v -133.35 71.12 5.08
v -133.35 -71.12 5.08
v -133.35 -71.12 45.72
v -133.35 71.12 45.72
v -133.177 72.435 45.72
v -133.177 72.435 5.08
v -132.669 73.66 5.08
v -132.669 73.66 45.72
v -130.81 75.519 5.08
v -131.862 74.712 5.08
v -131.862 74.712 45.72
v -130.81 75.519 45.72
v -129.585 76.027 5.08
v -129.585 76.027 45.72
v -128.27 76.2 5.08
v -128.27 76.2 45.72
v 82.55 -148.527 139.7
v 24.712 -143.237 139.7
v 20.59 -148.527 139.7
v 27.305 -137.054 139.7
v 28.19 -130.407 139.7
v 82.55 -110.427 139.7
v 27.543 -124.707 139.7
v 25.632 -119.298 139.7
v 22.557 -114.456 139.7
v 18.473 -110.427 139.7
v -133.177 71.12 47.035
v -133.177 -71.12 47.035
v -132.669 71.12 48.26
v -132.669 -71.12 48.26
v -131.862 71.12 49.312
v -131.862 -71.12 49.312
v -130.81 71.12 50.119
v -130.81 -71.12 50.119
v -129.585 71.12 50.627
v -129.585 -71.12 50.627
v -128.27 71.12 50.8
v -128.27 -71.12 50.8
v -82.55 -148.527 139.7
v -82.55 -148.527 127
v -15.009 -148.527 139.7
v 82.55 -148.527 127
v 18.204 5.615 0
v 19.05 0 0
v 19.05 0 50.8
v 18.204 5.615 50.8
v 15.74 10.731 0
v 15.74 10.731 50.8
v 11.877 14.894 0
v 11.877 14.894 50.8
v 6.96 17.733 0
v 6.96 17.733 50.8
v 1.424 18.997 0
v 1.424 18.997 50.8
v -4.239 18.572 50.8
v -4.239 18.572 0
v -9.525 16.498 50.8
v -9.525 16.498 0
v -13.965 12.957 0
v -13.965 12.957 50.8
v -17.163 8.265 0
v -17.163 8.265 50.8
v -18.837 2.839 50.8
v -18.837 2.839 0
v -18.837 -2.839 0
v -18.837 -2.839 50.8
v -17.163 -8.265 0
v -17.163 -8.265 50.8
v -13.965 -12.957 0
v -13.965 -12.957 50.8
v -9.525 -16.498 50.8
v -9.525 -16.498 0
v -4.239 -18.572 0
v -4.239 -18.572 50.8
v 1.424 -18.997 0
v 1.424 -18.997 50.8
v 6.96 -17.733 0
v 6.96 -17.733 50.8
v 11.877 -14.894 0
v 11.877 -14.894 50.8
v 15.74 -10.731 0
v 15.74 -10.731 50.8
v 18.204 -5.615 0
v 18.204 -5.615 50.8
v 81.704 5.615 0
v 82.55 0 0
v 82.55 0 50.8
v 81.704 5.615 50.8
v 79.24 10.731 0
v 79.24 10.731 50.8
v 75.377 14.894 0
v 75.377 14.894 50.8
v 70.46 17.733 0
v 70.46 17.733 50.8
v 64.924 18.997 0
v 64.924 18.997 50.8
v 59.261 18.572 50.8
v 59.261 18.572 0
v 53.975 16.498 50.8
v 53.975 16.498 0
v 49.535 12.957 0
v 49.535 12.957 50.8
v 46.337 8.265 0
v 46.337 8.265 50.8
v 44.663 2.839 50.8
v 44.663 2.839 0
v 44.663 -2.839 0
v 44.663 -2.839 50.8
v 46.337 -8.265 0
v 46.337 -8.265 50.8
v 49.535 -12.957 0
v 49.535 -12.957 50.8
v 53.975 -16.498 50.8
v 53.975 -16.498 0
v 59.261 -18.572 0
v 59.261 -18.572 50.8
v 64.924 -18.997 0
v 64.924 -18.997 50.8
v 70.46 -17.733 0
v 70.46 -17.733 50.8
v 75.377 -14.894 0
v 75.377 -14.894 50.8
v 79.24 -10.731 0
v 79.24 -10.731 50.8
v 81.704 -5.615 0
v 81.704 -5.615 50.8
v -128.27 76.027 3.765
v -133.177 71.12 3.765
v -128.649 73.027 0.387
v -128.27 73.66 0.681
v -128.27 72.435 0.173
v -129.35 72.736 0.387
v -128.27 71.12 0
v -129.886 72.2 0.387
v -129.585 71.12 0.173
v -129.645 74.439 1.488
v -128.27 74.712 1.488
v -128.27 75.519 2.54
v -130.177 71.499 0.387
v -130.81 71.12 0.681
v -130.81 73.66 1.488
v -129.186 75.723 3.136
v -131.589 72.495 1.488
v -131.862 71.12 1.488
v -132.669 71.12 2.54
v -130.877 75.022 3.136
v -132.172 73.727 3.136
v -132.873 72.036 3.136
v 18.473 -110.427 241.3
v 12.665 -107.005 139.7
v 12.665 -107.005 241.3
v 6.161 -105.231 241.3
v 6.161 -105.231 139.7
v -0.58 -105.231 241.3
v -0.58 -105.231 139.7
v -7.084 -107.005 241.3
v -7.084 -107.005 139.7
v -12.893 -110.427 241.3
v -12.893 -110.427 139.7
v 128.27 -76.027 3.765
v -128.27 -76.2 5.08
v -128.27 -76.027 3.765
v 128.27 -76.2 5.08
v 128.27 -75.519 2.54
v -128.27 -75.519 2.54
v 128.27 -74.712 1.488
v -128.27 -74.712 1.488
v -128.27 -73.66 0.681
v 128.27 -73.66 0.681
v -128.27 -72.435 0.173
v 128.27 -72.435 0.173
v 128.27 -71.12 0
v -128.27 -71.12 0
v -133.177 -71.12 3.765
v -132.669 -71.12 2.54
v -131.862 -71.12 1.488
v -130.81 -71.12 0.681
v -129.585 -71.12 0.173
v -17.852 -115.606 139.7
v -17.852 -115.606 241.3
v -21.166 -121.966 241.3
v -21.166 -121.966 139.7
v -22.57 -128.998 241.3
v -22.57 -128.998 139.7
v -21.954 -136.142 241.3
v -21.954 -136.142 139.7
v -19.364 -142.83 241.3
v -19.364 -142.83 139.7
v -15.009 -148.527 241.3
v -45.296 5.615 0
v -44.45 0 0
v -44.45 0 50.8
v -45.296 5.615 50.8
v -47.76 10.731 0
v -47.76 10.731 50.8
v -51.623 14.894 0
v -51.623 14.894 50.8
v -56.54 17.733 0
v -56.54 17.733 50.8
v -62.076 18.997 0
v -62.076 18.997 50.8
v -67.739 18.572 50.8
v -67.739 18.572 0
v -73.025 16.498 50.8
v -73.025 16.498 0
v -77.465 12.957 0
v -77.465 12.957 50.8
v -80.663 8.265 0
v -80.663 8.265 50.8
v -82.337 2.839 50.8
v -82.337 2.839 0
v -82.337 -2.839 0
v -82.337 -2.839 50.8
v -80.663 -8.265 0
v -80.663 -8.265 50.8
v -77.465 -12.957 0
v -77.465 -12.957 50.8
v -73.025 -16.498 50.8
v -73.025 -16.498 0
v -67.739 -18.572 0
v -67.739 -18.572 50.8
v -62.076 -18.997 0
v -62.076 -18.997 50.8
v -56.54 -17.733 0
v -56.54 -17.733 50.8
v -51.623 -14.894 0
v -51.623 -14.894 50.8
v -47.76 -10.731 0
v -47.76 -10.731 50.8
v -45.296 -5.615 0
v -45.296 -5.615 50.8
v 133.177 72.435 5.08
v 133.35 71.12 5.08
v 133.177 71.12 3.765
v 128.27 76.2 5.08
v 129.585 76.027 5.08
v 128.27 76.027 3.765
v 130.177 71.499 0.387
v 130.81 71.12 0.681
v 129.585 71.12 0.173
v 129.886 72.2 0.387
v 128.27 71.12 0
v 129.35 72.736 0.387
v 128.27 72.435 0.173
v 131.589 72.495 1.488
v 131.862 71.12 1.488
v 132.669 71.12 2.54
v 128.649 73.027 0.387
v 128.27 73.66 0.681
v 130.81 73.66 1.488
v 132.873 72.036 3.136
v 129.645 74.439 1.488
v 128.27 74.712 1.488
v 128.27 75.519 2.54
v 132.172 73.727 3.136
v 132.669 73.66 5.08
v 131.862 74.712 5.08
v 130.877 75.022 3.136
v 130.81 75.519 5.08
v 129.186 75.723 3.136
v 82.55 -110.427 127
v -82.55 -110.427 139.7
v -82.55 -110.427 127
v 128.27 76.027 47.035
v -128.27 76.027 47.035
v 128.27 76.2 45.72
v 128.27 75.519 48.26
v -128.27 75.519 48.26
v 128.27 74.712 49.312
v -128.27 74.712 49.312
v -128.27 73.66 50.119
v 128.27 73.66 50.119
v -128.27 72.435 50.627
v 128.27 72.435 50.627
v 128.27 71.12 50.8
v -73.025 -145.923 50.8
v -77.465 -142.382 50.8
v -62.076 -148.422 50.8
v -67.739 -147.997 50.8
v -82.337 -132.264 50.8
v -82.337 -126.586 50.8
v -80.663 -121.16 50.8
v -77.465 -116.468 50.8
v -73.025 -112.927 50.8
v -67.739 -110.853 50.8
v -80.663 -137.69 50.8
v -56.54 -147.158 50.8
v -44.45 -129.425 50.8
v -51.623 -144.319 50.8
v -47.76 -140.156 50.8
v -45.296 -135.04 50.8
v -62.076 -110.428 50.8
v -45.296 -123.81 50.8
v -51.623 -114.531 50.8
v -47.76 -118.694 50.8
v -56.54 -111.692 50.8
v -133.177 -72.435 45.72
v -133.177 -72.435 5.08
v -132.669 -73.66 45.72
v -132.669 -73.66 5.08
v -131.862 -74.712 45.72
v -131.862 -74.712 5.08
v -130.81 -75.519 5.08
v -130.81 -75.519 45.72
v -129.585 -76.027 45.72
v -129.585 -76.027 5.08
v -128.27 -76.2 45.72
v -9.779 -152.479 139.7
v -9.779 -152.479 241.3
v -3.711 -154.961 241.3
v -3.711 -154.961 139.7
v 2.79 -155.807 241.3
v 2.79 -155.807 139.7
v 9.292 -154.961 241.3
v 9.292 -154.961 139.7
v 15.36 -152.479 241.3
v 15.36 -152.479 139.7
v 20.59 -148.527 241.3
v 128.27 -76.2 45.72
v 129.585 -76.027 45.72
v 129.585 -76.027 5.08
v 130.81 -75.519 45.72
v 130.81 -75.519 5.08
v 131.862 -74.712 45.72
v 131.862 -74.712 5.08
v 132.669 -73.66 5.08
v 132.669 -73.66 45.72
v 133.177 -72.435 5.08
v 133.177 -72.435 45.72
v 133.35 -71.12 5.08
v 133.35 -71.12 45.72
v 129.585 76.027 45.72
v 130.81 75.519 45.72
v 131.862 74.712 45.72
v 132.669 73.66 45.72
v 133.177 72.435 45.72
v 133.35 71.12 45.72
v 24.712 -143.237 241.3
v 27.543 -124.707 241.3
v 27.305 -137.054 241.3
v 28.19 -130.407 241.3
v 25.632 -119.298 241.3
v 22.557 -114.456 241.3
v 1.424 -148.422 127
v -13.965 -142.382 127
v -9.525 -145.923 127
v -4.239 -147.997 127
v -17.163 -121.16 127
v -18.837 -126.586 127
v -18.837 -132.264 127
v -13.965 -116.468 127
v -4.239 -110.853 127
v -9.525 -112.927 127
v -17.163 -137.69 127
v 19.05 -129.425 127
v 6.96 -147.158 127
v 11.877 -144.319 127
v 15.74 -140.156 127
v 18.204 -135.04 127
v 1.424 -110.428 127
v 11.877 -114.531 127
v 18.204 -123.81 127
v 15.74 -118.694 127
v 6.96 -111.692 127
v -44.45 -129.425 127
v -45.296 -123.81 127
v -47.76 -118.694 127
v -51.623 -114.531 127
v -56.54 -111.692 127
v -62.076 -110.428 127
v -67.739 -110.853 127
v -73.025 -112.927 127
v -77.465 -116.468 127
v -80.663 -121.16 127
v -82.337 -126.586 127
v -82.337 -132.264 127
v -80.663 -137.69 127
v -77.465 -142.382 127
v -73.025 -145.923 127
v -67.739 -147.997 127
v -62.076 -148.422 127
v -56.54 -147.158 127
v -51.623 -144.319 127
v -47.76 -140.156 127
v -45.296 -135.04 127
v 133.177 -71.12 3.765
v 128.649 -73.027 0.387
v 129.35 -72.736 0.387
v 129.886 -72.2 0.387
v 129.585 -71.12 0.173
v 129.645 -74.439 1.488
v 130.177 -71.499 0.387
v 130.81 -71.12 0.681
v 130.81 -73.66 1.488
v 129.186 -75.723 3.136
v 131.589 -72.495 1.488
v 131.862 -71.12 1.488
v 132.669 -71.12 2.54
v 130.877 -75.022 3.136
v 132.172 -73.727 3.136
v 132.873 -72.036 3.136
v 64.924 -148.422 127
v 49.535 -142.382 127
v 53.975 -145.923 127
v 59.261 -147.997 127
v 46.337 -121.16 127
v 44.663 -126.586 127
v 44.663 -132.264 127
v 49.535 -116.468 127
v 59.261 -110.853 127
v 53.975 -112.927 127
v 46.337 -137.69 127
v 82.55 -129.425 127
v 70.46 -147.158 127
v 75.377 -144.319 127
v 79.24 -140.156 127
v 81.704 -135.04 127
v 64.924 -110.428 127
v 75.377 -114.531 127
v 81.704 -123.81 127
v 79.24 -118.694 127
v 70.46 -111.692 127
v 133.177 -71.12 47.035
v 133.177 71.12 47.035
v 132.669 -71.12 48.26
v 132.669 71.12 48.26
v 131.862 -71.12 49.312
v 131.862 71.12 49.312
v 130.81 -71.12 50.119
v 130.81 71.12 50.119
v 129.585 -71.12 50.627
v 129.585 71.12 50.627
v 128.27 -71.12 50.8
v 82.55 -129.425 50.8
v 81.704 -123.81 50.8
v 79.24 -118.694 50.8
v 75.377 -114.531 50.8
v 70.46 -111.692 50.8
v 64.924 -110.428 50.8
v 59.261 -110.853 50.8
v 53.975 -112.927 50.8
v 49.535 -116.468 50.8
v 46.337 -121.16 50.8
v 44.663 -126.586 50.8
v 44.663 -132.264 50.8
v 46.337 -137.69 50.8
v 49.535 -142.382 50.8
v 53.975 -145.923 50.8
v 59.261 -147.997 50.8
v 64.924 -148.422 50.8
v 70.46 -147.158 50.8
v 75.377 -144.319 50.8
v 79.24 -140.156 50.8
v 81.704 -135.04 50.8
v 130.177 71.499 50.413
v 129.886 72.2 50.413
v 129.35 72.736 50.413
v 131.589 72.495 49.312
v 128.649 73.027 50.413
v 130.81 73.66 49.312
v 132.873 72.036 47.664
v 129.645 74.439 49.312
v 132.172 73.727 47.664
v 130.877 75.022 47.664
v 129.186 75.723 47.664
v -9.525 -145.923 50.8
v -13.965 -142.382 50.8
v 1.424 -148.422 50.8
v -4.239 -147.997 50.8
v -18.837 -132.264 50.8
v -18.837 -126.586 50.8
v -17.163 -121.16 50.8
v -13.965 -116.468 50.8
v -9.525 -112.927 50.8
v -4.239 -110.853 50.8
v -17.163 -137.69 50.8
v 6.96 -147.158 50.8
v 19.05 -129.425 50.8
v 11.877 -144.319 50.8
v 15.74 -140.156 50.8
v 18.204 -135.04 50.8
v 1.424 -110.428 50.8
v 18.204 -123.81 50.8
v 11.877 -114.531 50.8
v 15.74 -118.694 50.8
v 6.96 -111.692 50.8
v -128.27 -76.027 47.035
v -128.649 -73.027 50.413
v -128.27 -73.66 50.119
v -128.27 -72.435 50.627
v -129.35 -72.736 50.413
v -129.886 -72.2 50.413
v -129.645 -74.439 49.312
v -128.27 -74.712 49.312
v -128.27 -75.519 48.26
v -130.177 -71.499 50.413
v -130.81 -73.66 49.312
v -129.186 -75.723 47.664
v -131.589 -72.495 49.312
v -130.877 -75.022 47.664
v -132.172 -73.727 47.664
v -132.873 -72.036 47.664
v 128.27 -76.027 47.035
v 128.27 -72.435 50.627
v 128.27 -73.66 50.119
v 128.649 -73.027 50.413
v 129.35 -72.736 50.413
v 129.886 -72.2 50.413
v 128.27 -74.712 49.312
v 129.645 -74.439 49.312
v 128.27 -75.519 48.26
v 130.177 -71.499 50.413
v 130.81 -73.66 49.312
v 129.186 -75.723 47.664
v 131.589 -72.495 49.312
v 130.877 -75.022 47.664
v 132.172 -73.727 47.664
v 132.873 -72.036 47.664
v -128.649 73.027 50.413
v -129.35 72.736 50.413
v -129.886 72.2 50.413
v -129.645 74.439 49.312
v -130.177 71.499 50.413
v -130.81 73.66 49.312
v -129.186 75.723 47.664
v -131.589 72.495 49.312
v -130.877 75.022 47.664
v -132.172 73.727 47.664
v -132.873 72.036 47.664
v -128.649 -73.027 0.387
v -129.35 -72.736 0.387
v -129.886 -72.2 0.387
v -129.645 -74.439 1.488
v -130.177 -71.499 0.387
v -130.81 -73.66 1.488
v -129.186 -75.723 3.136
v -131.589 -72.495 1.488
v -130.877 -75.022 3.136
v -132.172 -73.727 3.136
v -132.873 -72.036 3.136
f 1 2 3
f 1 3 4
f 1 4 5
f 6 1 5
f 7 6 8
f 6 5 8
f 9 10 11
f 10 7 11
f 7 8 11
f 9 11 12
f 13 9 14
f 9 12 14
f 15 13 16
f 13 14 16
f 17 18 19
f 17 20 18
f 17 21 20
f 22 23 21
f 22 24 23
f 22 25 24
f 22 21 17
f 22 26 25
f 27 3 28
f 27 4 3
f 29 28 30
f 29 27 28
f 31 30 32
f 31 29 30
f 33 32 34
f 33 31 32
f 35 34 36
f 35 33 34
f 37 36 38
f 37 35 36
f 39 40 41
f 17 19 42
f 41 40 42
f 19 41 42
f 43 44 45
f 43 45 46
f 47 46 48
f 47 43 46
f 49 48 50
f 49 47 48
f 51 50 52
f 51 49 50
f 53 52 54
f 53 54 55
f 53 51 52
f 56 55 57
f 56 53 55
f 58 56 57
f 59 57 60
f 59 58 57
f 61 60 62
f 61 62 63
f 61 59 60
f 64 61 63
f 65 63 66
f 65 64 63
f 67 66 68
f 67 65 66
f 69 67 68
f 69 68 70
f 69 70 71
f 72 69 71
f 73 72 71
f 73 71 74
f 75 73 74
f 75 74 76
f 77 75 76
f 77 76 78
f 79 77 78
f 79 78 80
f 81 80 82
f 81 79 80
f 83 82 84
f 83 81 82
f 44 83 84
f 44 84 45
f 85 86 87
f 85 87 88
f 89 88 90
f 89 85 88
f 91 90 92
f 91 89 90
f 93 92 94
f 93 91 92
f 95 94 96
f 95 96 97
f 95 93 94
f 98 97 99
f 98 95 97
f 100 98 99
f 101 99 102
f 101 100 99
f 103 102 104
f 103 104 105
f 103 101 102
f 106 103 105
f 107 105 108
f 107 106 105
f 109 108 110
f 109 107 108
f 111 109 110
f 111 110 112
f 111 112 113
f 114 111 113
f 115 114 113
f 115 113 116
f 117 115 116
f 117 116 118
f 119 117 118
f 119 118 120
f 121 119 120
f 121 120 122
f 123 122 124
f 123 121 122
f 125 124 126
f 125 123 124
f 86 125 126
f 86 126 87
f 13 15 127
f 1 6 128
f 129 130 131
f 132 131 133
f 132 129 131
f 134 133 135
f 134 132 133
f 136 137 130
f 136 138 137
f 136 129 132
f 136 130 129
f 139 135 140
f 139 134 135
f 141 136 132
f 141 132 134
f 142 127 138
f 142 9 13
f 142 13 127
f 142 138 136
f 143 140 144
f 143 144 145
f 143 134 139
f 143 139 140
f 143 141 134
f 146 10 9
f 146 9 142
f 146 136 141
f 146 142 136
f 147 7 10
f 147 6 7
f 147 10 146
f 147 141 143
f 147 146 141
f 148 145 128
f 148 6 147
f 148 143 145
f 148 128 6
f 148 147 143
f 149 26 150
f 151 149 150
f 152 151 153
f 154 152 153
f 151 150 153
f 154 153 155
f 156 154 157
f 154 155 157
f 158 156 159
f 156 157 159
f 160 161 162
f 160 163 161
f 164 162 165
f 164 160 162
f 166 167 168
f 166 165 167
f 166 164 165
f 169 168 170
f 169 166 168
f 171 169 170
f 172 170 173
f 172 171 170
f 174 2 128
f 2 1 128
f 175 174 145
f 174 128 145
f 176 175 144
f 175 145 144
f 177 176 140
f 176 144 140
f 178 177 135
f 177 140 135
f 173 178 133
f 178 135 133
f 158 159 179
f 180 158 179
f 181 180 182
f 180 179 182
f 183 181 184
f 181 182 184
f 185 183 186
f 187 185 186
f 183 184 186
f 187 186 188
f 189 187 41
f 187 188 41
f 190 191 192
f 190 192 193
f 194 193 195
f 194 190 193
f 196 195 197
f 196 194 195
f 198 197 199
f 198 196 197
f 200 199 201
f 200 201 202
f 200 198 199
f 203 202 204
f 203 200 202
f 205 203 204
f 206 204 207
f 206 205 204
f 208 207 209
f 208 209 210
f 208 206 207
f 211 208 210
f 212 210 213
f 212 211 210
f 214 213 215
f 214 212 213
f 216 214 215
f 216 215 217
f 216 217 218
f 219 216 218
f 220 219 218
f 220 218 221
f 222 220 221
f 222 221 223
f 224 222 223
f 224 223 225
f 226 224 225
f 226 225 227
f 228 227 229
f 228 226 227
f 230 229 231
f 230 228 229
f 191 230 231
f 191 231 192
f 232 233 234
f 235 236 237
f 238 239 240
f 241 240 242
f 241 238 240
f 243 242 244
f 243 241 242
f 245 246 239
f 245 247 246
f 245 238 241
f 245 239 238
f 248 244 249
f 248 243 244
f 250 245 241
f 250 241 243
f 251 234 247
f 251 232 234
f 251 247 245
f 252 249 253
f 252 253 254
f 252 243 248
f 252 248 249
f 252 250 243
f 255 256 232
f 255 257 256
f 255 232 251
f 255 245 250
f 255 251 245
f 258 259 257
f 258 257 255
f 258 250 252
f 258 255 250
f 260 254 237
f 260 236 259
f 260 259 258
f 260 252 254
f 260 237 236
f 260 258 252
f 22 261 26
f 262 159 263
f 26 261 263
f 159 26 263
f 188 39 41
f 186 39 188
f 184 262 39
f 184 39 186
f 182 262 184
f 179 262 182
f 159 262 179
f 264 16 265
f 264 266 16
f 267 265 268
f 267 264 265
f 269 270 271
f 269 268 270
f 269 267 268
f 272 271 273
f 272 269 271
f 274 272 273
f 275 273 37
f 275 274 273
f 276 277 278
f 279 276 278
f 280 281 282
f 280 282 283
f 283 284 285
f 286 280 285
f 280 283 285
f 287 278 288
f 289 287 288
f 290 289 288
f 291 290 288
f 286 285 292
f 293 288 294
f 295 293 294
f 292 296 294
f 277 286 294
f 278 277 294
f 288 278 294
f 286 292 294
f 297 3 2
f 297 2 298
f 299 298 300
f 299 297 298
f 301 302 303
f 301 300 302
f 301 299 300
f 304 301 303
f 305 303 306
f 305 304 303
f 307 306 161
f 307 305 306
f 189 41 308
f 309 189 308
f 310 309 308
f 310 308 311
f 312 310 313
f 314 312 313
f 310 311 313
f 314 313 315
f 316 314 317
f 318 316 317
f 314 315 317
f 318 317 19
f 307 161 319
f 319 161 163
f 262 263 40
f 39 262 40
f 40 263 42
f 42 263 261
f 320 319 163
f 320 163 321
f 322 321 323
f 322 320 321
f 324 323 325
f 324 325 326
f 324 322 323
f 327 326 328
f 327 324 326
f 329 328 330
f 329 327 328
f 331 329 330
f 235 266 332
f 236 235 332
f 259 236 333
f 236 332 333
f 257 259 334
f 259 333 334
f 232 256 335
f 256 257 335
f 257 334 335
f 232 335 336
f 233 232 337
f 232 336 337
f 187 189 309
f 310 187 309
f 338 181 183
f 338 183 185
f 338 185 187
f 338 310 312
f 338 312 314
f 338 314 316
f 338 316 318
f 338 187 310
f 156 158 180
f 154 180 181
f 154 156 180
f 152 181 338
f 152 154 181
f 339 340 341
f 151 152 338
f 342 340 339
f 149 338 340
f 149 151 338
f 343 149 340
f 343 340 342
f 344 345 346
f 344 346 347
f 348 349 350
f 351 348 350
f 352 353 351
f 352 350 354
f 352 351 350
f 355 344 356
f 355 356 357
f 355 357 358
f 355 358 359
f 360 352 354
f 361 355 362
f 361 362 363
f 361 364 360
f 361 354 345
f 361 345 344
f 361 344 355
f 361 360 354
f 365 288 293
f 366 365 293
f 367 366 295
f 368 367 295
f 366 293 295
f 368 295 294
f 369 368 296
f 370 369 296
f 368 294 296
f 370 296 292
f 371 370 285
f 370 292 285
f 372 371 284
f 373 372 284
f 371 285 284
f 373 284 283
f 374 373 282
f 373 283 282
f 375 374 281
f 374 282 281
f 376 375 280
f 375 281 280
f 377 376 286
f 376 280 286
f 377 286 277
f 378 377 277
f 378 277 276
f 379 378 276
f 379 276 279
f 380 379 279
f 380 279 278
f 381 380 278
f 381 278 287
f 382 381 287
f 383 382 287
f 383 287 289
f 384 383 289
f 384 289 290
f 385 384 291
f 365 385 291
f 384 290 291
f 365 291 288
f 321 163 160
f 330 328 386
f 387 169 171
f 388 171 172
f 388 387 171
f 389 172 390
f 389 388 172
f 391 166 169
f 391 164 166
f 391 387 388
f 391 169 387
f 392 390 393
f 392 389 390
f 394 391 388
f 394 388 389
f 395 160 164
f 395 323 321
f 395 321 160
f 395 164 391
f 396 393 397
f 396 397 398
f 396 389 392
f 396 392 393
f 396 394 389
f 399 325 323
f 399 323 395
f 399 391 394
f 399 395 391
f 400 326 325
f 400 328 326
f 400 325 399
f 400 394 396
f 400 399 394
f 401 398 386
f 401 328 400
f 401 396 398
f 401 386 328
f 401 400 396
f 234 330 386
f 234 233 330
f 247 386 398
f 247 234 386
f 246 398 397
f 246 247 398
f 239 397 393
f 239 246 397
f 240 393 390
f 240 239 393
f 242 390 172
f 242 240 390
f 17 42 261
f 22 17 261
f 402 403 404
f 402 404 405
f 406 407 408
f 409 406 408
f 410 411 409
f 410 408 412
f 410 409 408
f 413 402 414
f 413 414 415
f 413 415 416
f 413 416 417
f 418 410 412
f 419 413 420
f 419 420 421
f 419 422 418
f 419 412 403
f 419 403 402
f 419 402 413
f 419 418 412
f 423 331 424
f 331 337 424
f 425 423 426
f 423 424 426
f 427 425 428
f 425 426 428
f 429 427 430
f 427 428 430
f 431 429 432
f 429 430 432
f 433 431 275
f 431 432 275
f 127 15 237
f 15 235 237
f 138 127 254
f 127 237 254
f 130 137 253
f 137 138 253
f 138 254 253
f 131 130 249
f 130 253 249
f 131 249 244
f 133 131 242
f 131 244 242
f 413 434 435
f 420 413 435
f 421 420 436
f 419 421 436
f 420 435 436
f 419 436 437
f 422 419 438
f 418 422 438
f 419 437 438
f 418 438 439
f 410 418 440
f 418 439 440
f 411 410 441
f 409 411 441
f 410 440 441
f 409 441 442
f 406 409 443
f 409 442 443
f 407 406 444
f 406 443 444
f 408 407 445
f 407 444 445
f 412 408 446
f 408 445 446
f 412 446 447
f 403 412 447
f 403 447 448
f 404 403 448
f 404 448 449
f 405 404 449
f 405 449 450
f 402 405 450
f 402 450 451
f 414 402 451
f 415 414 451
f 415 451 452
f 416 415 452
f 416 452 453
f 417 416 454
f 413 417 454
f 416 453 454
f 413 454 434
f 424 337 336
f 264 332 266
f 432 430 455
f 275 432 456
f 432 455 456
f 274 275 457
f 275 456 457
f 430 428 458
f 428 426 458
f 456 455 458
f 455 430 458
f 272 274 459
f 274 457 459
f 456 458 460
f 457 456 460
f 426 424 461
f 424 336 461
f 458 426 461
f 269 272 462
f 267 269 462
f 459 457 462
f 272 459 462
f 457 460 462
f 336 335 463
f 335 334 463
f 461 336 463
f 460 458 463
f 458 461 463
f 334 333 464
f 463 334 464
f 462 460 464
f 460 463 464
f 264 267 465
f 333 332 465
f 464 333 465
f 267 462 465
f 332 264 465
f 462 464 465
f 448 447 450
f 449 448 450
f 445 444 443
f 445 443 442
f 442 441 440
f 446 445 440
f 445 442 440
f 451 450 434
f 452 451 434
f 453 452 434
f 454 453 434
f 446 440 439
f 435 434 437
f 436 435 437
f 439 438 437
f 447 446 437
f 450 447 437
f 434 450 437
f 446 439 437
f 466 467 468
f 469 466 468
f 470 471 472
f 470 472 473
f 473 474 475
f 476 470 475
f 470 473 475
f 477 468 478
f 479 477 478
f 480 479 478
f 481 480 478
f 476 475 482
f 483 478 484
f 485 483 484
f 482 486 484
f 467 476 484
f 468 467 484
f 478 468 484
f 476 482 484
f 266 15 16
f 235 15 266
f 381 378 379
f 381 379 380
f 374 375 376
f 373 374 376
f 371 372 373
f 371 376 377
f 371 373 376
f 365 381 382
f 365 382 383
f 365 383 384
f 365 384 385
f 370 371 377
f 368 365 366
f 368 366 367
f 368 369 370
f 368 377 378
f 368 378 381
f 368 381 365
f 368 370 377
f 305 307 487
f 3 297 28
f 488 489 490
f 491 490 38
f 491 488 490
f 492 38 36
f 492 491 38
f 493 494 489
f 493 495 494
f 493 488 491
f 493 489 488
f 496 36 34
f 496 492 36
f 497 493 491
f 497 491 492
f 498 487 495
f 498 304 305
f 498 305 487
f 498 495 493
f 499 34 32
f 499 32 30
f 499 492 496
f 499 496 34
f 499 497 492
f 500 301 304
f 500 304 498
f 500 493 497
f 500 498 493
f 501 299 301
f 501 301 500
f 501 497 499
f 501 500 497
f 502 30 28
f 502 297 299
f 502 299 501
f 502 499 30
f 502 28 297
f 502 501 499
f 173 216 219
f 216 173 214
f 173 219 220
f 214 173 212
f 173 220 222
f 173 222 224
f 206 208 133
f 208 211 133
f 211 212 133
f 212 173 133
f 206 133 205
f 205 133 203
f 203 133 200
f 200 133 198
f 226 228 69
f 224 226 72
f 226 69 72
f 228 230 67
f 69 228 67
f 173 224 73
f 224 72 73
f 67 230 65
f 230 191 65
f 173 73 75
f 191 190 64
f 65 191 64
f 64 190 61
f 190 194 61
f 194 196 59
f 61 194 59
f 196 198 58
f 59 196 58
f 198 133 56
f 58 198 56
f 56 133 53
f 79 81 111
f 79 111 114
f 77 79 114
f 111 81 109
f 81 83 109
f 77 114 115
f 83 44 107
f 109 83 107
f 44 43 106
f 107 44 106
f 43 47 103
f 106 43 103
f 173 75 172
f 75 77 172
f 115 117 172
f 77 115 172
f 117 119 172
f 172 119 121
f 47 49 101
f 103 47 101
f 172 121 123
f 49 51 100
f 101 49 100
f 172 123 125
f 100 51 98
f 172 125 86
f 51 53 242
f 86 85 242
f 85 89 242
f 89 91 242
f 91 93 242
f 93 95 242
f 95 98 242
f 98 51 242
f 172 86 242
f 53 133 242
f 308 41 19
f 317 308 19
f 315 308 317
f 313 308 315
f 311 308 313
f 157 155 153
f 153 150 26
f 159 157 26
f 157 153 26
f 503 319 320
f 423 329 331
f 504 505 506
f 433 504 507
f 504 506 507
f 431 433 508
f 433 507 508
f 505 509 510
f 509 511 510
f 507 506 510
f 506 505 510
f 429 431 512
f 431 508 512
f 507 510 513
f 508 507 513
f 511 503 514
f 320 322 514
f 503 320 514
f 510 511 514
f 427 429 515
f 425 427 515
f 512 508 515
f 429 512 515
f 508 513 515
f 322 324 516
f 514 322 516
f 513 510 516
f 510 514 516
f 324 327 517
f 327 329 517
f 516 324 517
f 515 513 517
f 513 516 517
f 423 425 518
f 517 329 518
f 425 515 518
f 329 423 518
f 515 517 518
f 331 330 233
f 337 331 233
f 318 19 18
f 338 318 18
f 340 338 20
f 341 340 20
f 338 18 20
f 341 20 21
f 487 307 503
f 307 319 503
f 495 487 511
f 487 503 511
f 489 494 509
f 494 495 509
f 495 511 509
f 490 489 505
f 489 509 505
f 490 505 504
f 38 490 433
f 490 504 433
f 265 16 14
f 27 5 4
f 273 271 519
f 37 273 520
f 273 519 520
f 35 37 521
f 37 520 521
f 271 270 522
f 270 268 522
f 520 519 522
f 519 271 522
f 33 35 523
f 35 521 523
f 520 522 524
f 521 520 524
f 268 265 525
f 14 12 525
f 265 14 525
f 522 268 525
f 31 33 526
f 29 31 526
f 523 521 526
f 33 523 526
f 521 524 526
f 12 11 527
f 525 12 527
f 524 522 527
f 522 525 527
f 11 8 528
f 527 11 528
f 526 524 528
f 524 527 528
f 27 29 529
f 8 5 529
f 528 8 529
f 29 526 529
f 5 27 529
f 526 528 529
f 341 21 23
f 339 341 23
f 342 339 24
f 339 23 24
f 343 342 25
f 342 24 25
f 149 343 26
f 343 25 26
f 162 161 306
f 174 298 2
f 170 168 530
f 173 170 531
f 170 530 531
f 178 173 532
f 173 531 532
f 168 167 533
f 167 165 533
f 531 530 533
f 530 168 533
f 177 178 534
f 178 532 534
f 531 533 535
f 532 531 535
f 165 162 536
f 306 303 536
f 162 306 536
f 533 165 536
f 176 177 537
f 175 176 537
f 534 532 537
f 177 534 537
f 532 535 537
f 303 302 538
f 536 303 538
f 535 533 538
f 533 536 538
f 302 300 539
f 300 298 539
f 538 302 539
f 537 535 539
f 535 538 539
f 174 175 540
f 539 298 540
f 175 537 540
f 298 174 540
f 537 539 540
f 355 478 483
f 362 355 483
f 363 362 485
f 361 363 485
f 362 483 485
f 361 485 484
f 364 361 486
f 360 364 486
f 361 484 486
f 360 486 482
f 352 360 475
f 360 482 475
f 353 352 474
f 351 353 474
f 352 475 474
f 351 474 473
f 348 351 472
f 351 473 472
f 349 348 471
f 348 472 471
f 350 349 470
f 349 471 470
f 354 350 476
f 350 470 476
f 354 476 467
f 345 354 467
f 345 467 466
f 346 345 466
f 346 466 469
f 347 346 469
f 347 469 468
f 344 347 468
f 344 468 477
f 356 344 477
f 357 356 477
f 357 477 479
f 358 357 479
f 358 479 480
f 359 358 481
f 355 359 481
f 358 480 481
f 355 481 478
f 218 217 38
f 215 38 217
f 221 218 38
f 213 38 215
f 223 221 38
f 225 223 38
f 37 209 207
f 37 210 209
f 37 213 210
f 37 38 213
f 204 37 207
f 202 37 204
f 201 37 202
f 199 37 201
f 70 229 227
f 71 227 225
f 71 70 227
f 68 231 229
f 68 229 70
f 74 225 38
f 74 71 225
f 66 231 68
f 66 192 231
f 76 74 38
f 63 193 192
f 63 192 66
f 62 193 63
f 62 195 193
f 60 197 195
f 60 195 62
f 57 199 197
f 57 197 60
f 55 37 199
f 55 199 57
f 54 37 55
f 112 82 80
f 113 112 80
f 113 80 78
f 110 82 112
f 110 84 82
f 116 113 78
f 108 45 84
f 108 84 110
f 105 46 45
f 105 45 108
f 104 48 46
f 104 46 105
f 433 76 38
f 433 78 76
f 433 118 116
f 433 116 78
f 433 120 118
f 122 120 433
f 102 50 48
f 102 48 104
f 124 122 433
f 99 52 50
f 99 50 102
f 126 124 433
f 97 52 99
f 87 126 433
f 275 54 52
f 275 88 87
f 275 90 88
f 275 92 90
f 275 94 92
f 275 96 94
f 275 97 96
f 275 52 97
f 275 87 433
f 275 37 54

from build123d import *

# Parameters (mm, degrees)
F0_W     = 266.7
F0_H     = 152.4
F0_R     = 19.05
F1_DEPTH = 50.8
F2_R     = 5.08
F3_R     = 19.05
F4_DEPTH = 76.2
F6_DEPTH = 12.7
F8_DEPTH = 101.6


with BuildPart() as f1:
    # F0 (on Top) → F1 (new body)
    with BuildSketch(Plane.XY):
        Rectangle(F0_W, F0_H)
        with Locations((-63.5, 0)):
            Circle(F0_R, mode=Mode.SUBTRACT)
        Circle(F0_R, mode=Mode.SUBTRACT)
        with Locations((63.5, 0)):
            Circle(F0_R, mode=Mode.SUBTRACT)
    extrude(amount=F1_DEPTH)

    # F2
    f2_edges = [f1.edges().sort_by_distance(p)[0] for p in [
        (-133.35, -76.2, 25.4),
        (133.35, -76.2, 25.4),
        (0, -76.2, 0),
        (0, -76.2, 50.8),
        (133.35, 76.2, 25.4),
        (133.35, 0, 0),
        (133.35, 0, 50.8),
        (-133.35, 76.2, 25.4),
        (0, 76.2, 0),
        (0, 76.2, 50.8),
        (-133.35, 0, 0),
        (-133.35, 0, 50.8),
    ]]
    fillet(f2_edges, radius=F2_R)


with BuildPart() as f4:
    # F3 (on face) → F4 (new body)
    with BuildSketch(Plane.XY.offset(50.8)):
        with Locations((-63.5, -129.4250041246)):
            Circle(F3_R)
    extrude(amount=F4_DEPTH)


with BuildPart() as f4b:
    # F3 (on face) → F4, piece 2 (new body)
    with BuildSketch(Plane.XY.offset(50.8)):
        with Locations((0, -129.4250041246)):
            Circle(F3_R)
    extrude(amount=F4_DEPTH)


with BuildPart() as f4c:
    # F3 (on face) → F4, piece 3 (new body)
    with BuildSketch(Plane.XY.offset(50.8)):
        with Locations((63.5, -129.4250041246)):
            Circle(F3_R)
    extrude(amount=F4_DEPTH)


with BuildPart() as f6:
    # F5 (on face) → F6 (new body)
    with BuildSketch(Plane.XY.offset(127)):
        with BuildLine():
            Line((-82.55, -148.526676), (82.55, -148.526676))
            Line((82.55, -148.526676), (82.55, -110.426676))
            Line((82.55, -110.426676), (-62.0978486286, -110.426676))
            ThreePointArc((-62.0978486286, -110.426676), (-49.5426814247, -116.4598293018), (-44.45, -129.4250041246))
            ThreePointArc((-44.45, -129.4250041246), (-63.5, -148.4750041246), (-82.55, -129.4250041246))
            Line((-82.55, -129.4250041246), (-82.55, -148.526676))
        make_face()
        with BuildLine():
            Line((-82.55, -110.426676), (-82.55, -129.4250041246))
            ThreePointArc((-82.55, -129.4250041246), (-77.4573185753, -116.4598293018), (-64.9021513714, -110.426676))
            Line((-64.9021513714, -110.426676), (-82.55, -110.426676))
        make_face()
        with BuildLine():
            ThreePointArc((-64.9021513714, -110.426676), (-77.4573185753, -116.4598293018), (-82.55, -129.4250041246))
            ThreePointArc((-82.55, -129.4250041246), (-63.5, -148.4750041246), (-44.45, -129.4250041246))
            ThreePointArc((-44.45, -129.4250041246), (-49.5426814247, -116.4598293018), (-62.0978486286, -110.426676))
            Line((-62.0978486286, -110.426676), (-64.9021513714, -110.426676))
        make_face()
    extrude(amount=F6_DEPTH)

    # F7 (on face) → F8 (join)
    with BuildSketch(Plane.XY.offset(139.7)):
        with BuildLine():
            Line((-12.8925051179, -110.426676), (18.4733471472, -110.426676))
            ThreePointArc((18.4733471472, -110.426676), (2.7904210147, -105.0068118334), (-12.8925051179, -110.426676))
        make_face()
        with BuildLine():
            ThreePointArc((20.5901547931, -148.526676), (26.2134143969, -140.2314431758), (28.1904210147, -130.4068118334))
            ThreePointArc((28.1904210147, -130.4068118334), (25.6323377881, -119.29794879), (18.4733471472, -110.426676))
            Line((18.4733471472, -110.426676), (-12.8925051179, -110.426676))
            ThreePointArc((-12.8925051179, -110.426676), (-22.5704667592, -128.9977797823), (-15.0093127638, -148.526676))
            Line((-15.0093127638, -148.526676), (20.5901547931, -148.526676))
        make_face()
        with BuildLine():
            ThreePointArc((-15.0093127638, -148.526676), (2.7904210147, -155.8068118334), (20.5901547931, -148.526676))
            Line((20.5901547931, -148.526676), (-15.0093127638, -148.526676))
        make_face()
    extrude(amount=F8_DEPTH)


solid = Compound([f1.part, f4.part, f4b.part, f4c.part, f6.part])
